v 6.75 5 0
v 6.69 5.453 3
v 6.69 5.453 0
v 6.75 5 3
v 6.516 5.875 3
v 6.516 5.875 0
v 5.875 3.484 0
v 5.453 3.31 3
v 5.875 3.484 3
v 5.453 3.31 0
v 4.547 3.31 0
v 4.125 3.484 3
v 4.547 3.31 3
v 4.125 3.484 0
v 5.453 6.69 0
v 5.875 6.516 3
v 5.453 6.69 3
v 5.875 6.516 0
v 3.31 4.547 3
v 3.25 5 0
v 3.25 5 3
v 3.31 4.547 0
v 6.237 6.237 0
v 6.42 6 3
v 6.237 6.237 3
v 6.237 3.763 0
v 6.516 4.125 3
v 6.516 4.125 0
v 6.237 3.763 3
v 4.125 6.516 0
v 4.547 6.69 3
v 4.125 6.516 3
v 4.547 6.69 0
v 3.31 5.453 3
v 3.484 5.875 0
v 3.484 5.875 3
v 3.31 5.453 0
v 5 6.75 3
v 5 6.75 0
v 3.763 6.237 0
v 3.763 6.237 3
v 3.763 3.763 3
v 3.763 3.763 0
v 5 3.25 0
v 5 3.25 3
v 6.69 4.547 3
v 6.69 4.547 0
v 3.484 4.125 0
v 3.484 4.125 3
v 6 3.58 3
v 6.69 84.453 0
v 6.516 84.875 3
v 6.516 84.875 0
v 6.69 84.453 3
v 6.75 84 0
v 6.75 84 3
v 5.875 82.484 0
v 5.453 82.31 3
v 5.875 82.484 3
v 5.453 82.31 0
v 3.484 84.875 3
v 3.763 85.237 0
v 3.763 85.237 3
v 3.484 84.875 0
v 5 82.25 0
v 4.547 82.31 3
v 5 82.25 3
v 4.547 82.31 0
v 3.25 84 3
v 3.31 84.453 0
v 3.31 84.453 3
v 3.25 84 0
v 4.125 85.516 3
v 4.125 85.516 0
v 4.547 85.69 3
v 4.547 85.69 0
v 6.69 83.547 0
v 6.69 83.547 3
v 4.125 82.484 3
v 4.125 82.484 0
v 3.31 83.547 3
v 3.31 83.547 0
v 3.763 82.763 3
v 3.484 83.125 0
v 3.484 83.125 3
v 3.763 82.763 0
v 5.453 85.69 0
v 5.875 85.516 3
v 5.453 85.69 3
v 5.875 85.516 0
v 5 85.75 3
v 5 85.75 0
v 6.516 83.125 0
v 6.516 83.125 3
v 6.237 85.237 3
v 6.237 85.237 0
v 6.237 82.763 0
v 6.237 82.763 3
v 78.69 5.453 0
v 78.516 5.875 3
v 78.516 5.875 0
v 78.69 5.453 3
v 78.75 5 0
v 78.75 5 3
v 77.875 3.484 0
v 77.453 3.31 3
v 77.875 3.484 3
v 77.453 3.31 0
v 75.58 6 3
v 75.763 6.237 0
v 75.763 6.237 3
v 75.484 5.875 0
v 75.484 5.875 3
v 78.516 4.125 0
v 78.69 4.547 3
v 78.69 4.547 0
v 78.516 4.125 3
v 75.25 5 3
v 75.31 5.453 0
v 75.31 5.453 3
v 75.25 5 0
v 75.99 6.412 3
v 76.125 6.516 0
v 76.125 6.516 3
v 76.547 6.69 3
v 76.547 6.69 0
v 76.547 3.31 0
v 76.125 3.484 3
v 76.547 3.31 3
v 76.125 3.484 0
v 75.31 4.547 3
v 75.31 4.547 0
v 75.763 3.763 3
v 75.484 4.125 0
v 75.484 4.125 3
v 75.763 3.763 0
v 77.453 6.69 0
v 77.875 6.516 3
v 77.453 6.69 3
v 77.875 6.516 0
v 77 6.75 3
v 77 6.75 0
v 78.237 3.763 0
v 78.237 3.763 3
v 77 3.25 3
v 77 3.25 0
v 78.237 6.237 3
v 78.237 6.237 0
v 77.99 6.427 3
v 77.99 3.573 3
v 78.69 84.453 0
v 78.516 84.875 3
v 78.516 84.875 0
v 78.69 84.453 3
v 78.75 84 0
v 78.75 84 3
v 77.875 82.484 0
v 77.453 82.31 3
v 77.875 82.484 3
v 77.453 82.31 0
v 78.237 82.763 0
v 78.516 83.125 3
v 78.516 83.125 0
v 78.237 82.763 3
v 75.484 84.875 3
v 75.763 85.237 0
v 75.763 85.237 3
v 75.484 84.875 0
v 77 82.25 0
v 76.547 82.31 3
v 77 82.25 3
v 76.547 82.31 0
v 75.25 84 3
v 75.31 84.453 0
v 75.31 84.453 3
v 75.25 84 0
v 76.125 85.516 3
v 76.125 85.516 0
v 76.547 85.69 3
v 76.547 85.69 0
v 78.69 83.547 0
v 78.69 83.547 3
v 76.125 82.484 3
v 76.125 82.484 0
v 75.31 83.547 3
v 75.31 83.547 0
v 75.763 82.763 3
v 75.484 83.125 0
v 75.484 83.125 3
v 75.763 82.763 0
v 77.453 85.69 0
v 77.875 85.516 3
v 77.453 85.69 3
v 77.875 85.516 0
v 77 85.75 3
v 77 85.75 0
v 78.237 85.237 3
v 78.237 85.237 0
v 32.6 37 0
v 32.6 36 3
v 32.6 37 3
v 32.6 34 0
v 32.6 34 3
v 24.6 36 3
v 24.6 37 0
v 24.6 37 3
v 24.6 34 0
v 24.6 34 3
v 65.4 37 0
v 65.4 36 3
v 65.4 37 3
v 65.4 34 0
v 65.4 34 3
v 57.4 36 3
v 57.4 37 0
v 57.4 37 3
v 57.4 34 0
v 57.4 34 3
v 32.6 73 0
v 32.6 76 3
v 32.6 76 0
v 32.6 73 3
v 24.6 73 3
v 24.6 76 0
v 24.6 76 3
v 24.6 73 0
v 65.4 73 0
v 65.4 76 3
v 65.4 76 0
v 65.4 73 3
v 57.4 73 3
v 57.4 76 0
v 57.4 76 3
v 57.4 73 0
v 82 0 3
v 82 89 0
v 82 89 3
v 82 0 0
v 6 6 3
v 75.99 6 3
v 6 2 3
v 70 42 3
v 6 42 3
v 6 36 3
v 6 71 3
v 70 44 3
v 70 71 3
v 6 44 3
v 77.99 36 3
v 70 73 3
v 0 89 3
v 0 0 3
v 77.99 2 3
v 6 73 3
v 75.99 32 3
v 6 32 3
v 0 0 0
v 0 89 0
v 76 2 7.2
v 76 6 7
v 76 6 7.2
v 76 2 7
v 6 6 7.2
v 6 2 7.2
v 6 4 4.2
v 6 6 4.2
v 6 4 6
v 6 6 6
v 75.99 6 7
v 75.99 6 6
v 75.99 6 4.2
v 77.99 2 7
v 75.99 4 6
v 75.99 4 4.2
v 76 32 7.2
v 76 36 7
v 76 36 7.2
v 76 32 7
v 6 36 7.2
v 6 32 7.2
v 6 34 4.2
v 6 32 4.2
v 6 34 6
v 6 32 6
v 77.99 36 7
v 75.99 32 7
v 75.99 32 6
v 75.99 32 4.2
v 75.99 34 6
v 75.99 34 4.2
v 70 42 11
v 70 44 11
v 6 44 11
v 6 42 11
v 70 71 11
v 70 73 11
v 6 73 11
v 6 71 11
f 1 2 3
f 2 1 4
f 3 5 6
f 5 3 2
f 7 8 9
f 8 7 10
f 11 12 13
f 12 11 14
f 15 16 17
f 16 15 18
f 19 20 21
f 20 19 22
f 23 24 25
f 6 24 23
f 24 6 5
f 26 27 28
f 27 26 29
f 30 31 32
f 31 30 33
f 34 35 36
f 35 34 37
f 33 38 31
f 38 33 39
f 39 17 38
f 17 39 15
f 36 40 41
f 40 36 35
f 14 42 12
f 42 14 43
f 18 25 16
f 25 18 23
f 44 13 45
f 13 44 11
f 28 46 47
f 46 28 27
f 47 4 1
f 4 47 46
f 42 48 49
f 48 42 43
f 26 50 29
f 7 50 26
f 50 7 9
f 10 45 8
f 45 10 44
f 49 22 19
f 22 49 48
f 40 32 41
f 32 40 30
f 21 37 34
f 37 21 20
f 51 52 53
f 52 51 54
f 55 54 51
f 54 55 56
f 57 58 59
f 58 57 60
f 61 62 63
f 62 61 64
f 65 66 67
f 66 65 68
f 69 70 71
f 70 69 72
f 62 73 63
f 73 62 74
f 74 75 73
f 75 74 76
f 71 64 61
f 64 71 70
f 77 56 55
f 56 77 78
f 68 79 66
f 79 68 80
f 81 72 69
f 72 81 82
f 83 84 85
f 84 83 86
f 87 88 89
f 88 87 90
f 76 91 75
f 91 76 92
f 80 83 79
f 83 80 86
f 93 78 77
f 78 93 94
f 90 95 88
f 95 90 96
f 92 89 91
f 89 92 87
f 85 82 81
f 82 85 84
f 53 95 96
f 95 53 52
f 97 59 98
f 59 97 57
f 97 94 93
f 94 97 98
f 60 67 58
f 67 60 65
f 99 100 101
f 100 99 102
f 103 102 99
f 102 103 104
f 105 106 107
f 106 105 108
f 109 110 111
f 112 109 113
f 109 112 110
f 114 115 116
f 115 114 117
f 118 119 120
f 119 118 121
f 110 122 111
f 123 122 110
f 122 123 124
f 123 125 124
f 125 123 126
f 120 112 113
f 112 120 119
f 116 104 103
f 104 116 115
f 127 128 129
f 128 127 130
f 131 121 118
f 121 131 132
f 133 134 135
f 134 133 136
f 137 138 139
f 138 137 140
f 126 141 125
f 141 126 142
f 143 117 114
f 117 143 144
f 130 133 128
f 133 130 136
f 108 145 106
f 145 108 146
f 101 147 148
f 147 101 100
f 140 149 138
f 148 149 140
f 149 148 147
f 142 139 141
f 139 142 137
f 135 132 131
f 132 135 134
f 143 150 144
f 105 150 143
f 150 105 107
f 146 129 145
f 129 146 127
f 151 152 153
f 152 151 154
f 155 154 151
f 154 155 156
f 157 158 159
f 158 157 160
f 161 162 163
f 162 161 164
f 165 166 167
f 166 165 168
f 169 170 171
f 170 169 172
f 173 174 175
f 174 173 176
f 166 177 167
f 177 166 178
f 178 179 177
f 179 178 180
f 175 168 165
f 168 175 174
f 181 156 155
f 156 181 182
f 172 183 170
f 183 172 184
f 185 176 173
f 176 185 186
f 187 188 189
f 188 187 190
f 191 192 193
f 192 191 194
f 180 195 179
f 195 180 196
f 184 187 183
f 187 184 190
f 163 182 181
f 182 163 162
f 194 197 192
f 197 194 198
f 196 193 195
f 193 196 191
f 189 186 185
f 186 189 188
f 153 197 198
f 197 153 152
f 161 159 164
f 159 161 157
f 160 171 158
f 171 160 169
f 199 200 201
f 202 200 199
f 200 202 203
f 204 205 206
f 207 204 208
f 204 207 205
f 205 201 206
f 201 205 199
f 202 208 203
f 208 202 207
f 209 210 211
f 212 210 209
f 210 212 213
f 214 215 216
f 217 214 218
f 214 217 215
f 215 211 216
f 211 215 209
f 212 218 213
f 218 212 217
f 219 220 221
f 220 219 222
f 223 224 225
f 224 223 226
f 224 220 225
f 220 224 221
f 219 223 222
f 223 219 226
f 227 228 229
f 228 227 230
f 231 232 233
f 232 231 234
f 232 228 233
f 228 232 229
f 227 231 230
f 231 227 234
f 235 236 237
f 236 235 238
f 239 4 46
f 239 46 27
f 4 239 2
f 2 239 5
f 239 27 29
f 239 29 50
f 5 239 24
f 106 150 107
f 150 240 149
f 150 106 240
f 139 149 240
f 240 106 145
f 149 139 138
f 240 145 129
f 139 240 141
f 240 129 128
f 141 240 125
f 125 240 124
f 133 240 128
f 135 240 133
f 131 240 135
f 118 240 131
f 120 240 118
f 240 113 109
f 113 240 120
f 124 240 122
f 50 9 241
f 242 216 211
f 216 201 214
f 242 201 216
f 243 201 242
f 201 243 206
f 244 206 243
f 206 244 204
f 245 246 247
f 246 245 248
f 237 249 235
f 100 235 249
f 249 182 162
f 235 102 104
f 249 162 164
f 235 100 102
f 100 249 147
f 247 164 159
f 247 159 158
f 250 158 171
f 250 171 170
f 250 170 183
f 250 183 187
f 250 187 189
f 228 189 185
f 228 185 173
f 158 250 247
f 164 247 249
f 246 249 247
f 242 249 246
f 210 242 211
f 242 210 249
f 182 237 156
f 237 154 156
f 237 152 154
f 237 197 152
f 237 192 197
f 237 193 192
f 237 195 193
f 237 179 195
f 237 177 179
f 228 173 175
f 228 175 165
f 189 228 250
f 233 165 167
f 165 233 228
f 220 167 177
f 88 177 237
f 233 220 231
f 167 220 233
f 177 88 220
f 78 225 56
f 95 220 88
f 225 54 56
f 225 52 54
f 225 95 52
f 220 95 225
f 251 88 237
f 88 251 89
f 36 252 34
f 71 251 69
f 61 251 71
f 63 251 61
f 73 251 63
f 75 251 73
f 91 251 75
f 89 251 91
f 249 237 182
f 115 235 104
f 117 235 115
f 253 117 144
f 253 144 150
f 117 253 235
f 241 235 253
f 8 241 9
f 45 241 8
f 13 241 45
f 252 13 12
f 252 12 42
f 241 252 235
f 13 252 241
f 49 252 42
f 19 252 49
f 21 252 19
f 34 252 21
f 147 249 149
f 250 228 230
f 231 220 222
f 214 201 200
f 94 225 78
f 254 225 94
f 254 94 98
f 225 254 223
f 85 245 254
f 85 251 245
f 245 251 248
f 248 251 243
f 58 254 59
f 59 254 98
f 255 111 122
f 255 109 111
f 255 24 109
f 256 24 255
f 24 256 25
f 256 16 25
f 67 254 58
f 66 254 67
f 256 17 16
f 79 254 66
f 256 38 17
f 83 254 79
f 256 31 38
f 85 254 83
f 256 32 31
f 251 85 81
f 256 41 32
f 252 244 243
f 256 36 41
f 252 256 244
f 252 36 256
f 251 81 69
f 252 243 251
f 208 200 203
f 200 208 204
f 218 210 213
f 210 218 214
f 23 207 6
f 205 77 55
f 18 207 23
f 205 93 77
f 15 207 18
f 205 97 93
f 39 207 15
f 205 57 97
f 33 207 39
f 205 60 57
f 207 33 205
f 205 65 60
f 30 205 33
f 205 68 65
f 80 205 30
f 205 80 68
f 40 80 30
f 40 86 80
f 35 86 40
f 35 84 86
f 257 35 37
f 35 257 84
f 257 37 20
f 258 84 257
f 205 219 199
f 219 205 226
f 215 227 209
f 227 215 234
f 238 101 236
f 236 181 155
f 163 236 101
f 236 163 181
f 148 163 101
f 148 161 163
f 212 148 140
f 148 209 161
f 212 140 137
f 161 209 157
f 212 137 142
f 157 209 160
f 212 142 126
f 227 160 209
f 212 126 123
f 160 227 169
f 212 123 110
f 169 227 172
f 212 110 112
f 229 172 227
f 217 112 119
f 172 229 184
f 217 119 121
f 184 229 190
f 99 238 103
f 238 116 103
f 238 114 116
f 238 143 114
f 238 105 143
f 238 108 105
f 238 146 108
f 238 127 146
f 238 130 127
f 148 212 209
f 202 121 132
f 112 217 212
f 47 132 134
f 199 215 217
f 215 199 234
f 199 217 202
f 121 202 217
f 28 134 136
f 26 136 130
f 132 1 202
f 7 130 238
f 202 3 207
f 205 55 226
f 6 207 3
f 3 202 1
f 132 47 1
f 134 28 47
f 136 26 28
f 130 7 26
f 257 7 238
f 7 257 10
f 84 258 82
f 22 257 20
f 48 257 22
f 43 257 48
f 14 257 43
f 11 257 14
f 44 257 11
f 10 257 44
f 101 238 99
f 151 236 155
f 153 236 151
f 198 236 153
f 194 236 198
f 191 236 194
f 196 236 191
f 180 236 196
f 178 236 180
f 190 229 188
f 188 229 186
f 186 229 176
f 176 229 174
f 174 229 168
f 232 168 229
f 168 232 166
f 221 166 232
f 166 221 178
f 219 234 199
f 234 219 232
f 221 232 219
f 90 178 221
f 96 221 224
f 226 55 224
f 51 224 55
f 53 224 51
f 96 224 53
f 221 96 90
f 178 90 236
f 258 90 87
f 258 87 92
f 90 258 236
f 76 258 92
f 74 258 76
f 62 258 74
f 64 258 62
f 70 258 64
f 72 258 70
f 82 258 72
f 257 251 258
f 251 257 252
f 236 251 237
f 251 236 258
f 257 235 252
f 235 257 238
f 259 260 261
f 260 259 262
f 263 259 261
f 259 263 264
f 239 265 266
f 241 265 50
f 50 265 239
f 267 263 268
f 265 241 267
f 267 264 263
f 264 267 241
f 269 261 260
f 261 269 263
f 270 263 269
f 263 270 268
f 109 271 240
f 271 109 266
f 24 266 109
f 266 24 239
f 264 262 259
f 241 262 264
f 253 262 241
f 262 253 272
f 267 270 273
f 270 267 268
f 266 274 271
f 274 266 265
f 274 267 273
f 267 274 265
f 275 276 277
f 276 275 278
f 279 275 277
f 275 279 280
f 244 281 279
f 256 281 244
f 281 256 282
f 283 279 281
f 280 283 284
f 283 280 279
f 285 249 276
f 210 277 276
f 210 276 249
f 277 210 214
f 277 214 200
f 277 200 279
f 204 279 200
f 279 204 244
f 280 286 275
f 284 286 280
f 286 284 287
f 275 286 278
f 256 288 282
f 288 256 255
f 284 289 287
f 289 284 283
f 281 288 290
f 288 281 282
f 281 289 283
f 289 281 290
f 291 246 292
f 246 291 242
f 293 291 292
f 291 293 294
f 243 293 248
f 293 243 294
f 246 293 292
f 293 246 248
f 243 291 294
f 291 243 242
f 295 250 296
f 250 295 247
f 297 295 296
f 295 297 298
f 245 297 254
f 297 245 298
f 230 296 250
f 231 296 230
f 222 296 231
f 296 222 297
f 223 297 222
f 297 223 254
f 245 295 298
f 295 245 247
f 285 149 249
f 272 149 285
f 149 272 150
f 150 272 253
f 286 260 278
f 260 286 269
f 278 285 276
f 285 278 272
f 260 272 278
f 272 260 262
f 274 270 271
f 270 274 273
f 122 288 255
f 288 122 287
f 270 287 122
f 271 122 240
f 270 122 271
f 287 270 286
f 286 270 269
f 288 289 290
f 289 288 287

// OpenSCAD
// KenLED controller mounting tray — ESP32-S3-DevKitC-1 + DROK USB buck.
// Prints flat, no supports. Screws or VHB-tapes into the junction box.
//
// MEASURE YOUR BOARDS and adjust the parameters below before printing —
// clone boards vary a millimeter or two. Rail fit should be snug, not forced.

// ---- parameters (mm) ----
s3_len = 70;      // DevKitC-1 board length (measure yours)
s3_wid = 26;      // board width
pcb_t = 1.8;      // rail groove height (1.6mm PCB + slip)
rail_lip = 2;     // how far the rail lips overhang the board edge

drok_len = 64;    // DROK buck length (measure)
drok_wid = 27;    // DROK width
drok_wall = 8;    // cradle end-wall height

base_t = 3;       // baseplate thickness
gap = 12;         // spacing between the two bays
margin = 6;

tray_len = max(s3_len, drok_len) + 2 * margin;
tray_wid = s3_wid + drok_wid + gap + 2 * margin + 12;

// ---- baseplate with corner screw holes + zip-tie slots ----
difference() {
  cube([tray_len, tray_wid, base_t]);
  for (x = [5, tray_len - 5], y = [5, tray_wid - 5])
    translate([x, y, -1]) cylinder(h = base_t + 2, d = 3.5, $fn = 24); // M3 screws
  // zip-tie slots flanking each bay for cable dressing / backup retention
  for (y = [margin + s3_wid + 2, margin + s3_wid + gap + drok_wid + 2])
    for (x = [tray_len * 0.3, tray_len * 0.7])
      translate([x, y, -1]) cube([8, 3, base_t + 2]);
}

// ---- bay 1: S3 edge rails (board slides in from the end, USB ends open) ----
// Each rail is an L-profile: groove at PCB height, lip overhanging the board edge.
// outer rail — lip faces +y (toward the board)
translate([margin, margin - 4, base_t]) difference() {
  cube([s3_len, 4, pcb_t + 2.4]);
  translate([-1, 4 - rail_lip, 1.2]) cube([s3_len + 2, rail_lip + 1, pcb_t]);
}
// inner rail — lip faces -y (toward the board)
translate([margin, margin + s3_wid, base_t]) difference() {
  cube([s3_len, 4, pcb_t + 2.4]);
  translate([-1, -1, 1.2]) cube([s3_len + 2, rail_lip + 1, pcb_t]);
}

// end stop so the board can't slide out once the box lid is on
translate([margin + s3_len - 0.01, margin - 4, base_t]) cube([2, s3_wid + 8, 4]);

// ---- bay 2: DROK cradle ----
// Side walls only — BOTH ENDS FULLY OPEN so the screw terminals and USB port
// stay accessible. Sides stop lateral motion; the zip ties (slots in the base)
// stop lift and lengthwise creep.
drok_y = margin + s3_wid + gap;
for (y = [drok_y - 2, drok_y + drok_wid])
  translate([margin, y, base_t]) cube([drok_len, 2, drok_wall]); // full-height side walls
